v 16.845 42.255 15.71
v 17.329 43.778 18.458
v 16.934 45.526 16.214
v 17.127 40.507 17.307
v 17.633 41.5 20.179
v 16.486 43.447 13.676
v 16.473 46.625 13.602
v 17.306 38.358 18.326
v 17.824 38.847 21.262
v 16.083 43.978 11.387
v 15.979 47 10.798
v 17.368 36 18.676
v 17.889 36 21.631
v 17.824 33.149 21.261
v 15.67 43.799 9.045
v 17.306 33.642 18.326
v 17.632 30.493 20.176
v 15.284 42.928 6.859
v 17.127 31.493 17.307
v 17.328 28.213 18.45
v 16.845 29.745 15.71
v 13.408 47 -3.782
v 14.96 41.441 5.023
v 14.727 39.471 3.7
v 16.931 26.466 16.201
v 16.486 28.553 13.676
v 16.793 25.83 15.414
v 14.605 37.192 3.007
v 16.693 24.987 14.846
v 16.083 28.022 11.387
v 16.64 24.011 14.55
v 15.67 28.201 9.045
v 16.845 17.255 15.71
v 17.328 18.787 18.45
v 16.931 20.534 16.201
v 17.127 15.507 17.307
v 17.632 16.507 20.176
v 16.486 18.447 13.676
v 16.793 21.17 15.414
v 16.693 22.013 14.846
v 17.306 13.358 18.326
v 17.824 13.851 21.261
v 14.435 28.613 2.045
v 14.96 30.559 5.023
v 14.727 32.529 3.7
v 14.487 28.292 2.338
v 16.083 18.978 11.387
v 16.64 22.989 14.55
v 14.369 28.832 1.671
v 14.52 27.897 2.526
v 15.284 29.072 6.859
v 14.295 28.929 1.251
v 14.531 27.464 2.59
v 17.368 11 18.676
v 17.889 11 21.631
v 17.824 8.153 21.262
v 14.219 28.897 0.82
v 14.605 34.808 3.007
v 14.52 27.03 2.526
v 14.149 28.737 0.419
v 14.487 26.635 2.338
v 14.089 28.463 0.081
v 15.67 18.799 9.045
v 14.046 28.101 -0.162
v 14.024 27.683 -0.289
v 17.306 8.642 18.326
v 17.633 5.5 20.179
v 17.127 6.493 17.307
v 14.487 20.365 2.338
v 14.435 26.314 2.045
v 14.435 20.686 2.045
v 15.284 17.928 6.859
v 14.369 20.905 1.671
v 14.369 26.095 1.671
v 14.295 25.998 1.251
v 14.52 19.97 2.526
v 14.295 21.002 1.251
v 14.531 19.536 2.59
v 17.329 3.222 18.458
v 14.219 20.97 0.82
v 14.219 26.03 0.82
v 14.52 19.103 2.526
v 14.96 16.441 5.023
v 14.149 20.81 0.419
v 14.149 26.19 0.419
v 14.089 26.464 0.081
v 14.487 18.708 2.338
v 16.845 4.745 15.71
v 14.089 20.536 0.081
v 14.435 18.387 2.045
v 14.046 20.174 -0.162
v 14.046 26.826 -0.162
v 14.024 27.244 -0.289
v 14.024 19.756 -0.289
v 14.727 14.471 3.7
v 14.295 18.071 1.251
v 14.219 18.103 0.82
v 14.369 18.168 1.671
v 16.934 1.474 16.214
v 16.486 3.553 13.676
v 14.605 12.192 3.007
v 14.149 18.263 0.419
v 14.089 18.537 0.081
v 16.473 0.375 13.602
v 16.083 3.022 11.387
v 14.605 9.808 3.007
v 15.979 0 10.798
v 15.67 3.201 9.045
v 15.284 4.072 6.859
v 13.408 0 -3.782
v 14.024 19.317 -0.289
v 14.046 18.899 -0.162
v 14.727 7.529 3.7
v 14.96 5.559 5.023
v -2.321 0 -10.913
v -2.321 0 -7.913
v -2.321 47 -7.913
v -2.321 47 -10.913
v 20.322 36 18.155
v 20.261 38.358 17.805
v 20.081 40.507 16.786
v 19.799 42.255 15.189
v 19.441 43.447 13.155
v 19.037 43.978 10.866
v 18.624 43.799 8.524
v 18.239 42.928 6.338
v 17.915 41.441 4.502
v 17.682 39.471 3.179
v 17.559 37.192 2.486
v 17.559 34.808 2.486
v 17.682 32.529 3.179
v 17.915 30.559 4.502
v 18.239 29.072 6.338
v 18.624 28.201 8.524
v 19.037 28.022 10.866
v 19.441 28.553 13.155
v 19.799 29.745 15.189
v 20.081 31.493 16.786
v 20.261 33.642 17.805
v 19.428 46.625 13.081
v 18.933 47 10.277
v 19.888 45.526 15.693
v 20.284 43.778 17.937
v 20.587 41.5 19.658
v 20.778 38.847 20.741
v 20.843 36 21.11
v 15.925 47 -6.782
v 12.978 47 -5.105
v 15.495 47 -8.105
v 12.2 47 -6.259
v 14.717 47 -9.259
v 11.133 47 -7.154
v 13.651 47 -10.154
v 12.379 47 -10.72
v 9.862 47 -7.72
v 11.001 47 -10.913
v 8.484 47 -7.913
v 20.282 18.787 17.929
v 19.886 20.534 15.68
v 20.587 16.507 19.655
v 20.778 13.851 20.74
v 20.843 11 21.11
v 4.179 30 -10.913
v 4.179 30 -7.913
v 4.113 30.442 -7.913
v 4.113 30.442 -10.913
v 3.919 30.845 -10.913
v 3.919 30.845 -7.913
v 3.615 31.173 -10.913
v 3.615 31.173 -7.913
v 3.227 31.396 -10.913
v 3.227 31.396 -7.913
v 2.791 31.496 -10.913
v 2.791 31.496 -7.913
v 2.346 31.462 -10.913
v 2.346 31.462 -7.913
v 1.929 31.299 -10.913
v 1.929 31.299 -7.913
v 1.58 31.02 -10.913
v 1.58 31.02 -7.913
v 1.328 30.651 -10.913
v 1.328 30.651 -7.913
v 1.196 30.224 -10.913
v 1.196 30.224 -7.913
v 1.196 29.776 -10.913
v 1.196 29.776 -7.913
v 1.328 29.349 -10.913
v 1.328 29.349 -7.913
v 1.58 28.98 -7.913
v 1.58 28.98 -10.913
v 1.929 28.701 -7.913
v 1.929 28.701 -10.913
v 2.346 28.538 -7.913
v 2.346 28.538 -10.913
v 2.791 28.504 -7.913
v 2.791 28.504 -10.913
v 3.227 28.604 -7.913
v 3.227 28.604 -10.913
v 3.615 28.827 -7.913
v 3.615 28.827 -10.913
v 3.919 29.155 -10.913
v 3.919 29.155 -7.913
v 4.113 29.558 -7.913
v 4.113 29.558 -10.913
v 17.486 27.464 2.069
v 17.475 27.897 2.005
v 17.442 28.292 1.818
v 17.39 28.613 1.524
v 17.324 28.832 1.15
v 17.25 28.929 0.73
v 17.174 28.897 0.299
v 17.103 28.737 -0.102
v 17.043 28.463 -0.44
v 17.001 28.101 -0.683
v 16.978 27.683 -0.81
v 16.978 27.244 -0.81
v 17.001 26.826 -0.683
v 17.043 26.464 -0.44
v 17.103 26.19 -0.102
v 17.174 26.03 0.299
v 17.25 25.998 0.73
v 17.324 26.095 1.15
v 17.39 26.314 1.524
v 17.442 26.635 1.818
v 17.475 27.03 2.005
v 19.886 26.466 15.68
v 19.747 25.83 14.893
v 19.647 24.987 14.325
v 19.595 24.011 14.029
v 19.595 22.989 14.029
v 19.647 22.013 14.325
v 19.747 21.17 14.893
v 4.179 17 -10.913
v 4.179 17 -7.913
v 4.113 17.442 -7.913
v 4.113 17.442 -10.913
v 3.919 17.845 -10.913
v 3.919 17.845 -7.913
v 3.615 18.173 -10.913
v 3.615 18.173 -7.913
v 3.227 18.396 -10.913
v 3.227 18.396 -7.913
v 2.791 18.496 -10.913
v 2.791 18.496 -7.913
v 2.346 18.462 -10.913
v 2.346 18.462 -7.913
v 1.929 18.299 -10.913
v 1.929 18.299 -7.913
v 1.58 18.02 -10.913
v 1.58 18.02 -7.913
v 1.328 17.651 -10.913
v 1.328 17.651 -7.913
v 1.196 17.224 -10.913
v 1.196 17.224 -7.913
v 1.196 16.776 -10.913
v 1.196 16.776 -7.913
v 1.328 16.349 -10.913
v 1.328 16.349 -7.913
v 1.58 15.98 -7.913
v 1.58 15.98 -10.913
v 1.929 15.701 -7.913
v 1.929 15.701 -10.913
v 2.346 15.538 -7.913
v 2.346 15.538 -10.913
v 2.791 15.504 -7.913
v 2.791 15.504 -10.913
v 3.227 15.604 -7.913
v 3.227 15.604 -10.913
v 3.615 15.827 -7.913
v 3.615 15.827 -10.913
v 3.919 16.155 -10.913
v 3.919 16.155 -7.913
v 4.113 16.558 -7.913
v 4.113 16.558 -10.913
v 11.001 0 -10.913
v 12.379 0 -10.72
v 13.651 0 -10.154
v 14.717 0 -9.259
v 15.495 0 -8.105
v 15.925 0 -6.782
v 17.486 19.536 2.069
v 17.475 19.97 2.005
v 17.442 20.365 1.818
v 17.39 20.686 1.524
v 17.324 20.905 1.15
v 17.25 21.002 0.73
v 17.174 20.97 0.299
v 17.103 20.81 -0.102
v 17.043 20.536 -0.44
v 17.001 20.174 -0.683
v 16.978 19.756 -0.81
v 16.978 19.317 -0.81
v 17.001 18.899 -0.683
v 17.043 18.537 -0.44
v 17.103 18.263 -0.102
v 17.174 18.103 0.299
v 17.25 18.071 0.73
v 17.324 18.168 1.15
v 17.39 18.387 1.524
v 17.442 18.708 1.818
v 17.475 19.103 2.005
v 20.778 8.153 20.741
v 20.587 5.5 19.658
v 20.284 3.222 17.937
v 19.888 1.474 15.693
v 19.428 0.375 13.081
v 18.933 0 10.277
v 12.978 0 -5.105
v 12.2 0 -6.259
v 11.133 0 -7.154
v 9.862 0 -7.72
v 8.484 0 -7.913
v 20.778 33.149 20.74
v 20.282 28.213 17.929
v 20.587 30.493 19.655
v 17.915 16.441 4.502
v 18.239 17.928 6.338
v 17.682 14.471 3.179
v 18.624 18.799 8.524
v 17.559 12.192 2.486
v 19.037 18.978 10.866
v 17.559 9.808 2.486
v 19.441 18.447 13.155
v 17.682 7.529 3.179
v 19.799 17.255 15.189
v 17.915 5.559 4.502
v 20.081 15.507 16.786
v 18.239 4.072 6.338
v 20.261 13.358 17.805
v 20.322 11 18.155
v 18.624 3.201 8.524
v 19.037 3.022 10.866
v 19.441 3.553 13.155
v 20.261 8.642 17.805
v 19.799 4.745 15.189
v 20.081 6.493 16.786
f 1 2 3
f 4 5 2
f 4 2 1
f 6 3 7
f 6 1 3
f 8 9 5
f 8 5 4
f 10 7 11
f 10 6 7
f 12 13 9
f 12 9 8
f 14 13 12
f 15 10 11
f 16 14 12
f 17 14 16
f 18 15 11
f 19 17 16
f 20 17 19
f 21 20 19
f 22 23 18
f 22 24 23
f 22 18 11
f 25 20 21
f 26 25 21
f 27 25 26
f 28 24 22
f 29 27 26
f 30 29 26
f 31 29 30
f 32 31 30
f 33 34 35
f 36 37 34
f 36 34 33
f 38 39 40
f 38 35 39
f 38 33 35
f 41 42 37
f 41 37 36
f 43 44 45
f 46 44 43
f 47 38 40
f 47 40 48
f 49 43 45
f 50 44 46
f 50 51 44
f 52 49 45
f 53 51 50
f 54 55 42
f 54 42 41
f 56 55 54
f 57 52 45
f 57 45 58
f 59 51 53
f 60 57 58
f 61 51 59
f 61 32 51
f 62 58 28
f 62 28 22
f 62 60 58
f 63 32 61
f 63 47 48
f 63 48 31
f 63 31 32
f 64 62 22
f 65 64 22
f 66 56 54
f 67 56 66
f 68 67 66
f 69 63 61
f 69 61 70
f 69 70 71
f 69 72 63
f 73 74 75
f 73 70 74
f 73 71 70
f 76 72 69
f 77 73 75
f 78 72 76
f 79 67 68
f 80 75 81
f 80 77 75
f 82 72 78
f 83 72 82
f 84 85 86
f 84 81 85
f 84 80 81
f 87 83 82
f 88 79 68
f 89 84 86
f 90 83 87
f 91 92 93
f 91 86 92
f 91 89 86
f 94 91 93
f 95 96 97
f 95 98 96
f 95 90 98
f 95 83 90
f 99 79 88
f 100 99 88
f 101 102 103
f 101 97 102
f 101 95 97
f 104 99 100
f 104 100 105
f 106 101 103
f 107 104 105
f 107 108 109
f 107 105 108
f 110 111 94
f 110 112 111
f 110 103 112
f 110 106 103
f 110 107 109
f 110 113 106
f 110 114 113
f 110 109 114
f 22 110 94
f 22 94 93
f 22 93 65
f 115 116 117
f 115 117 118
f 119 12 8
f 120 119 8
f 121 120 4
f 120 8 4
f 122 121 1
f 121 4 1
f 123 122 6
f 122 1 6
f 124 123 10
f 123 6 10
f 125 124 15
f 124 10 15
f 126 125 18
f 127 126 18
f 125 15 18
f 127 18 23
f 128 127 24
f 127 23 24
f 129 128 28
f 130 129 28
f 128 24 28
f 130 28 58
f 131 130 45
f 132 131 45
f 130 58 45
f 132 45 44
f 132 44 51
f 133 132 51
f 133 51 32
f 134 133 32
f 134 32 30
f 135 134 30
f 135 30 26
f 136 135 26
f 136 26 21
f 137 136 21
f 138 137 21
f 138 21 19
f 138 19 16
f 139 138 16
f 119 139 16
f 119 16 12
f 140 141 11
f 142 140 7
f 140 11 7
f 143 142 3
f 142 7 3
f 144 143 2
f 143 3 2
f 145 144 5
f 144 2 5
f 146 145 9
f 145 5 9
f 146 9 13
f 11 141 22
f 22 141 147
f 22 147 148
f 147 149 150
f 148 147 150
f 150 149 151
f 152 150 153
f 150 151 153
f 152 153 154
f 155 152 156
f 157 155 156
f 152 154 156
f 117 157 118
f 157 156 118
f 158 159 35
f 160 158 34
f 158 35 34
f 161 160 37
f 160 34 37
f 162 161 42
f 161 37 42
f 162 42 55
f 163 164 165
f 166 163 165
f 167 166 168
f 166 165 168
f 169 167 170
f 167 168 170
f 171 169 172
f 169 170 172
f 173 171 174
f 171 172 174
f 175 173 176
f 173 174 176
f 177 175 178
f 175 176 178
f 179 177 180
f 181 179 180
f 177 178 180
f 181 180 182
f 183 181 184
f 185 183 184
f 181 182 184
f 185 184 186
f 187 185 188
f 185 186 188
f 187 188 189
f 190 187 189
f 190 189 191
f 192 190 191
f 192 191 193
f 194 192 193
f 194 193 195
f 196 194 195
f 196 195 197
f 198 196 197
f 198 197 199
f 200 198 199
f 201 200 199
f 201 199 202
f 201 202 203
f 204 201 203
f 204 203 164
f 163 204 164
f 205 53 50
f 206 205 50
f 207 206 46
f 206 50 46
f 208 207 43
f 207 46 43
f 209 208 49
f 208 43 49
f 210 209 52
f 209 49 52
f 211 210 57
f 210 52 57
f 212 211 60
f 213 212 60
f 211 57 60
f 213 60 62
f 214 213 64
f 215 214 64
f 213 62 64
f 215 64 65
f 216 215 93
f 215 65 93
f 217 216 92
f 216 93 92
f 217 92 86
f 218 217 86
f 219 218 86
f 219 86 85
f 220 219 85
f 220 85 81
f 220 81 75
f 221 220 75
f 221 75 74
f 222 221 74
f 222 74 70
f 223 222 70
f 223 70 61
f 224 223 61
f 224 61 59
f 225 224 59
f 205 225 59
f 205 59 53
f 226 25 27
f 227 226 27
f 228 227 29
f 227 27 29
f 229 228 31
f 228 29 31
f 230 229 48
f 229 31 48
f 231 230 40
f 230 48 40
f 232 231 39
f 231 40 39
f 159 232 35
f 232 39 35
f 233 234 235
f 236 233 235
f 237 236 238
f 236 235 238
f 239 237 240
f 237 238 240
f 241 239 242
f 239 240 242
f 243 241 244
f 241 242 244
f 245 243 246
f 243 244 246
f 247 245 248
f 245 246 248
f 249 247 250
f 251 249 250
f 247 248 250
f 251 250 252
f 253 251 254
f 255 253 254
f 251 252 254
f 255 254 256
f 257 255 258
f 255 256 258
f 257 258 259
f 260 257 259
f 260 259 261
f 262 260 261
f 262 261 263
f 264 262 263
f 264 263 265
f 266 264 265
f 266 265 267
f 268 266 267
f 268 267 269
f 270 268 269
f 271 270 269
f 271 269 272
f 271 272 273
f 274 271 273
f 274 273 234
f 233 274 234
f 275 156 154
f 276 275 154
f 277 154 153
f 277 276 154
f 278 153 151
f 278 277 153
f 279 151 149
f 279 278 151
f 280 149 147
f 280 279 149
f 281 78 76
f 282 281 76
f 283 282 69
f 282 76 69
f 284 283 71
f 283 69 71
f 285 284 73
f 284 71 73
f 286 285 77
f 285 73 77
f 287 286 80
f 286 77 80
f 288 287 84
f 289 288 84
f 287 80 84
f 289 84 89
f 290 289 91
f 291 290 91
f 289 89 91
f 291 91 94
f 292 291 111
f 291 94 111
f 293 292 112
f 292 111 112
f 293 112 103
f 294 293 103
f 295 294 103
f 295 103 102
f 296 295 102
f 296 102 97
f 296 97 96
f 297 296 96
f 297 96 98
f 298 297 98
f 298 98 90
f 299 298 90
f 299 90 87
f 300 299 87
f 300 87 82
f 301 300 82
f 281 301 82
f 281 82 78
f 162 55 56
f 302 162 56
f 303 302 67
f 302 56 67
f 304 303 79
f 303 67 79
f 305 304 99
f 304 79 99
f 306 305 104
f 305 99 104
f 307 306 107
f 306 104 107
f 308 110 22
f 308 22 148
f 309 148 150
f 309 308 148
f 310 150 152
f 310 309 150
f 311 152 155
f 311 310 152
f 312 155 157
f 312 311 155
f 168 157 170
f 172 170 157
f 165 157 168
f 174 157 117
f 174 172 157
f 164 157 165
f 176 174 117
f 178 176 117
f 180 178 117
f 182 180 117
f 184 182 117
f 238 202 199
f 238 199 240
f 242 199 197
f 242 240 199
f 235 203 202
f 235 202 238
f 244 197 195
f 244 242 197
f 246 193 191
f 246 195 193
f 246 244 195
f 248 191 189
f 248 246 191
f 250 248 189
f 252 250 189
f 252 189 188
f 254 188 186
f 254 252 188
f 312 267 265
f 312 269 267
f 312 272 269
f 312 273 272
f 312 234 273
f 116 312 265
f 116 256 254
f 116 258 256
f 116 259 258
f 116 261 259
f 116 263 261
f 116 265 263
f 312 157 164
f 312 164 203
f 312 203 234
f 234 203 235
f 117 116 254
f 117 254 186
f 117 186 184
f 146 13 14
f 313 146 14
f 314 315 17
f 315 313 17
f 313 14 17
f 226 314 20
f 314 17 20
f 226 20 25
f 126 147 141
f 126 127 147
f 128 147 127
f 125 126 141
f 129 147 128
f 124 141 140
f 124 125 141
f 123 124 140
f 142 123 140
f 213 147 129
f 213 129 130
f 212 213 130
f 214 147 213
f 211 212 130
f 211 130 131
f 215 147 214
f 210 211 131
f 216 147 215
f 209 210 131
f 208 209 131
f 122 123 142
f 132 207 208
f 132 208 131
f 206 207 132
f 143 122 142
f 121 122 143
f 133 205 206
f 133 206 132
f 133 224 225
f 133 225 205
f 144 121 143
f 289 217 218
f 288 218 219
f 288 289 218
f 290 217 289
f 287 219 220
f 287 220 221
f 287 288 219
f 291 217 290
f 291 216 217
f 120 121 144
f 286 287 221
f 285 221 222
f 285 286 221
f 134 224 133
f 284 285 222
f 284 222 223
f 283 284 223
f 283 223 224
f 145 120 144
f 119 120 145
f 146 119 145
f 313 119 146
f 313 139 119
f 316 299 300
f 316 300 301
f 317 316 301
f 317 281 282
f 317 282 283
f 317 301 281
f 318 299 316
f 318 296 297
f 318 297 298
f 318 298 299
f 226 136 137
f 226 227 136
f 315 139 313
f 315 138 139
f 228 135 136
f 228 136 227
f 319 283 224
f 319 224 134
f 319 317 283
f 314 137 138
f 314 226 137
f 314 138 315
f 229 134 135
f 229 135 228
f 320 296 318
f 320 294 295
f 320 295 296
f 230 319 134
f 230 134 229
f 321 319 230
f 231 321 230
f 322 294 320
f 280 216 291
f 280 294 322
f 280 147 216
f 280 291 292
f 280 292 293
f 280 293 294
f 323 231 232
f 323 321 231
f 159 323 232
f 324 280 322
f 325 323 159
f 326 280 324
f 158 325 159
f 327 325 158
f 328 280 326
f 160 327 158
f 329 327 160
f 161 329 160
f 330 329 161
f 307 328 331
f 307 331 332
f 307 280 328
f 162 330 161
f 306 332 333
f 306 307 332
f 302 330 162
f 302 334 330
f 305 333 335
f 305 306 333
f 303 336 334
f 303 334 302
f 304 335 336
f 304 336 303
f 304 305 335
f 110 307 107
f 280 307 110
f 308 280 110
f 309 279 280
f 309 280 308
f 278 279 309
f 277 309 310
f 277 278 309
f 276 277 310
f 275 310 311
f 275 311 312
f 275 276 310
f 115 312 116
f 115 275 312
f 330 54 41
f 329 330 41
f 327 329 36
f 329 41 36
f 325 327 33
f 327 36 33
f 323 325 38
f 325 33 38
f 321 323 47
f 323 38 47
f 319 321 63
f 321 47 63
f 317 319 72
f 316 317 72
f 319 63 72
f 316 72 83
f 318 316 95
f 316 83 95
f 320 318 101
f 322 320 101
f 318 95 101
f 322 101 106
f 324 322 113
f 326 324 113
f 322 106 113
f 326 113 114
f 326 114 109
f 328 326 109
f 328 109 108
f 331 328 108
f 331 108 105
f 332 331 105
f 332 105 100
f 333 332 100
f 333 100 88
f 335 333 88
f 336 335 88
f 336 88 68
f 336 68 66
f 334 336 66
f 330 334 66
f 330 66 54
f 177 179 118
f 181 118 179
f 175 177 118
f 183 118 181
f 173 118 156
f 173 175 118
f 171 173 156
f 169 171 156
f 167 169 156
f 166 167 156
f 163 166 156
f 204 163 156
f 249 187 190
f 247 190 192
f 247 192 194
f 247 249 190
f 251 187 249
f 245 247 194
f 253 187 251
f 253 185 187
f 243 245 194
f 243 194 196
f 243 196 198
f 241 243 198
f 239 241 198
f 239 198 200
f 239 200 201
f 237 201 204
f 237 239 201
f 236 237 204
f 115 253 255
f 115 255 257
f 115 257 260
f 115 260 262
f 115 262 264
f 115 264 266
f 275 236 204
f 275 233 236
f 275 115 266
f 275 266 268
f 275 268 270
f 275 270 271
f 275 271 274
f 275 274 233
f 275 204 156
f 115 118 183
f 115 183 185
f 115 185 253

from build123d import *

# Parameters (mm, degrees)
BOSS_EXTRUDE1_DEPTH = 47
SKETCH2_R           = 1.5
CUT_EXTRUDE1_DEPTH  = 4
SKETCH3_R           = 8
CUT_EXTRUDE2_DEPTH  = 9.560785614
SKETCH4_R           = 1.47
CUT_EXTRUDE3_DEPTH  = 9.560785614


with BuildPart() as part:
    # Sketch1 → Boss-Extrude1 (new body)
    with BuildSketch(Plane(origin=(0, 0, 0), x_dir=(1, 0, 0), z_dir=(0, 1, 0))):
        with BuildLine():
            Line((-2.32059976, 10.913457617), (11.001200978, 10.913457617))
            ThreePointArc((11.001200978, 10.913457617), (14.215139026, 9.743679833), (15.925239743, 6.781698506))
            Line((15.925239743, 6.781698506), (20.843268829, -21.10983044))
            Line((20.843268829, -21.10983044), (17.88884557, -21.630774973))
            Line((17.88884557, -21.630774973), (13.407940849, 3.781698506))
            ThreePointArc((13.407940849, 3.781698506), (11.697840132, 6.743679833), (8.483902084, 7.913457617))
            Line((8.483902084, 7.913457617), (-2.32059976, 7.913457617))
            Line((-2.32059976, 7.913457617), (-2.32059976, 10.913457617))
        make_face()
    extrude(amount=BOSS_EXTRUDE1_DEPTH)

    # Sketch2 → Cut-Extrude1 (cut, through all)
    with BuildSketch(Plane.XY.offset(-7.913457617)):
        with Locations((2.67940024, 30)):
            Circle(SKETCH2_R)
        with Locations((2.67940024, 17)):
            Circle(SKETCH2_R)
    extrude(amount=-CUT_EXTRUDE1_DEPTH, mode=Mode.SUBTRACT)

    # Sketch3 → Cut-Extrude2 (cut, through all)
    with BuildSketch(Plane(origin=(13.650350495, 0, -2.406925088), x_dir=(0.173648178, 0, 0.984807753), z_dir=(-0.984807753, 0, 0.173648178))):
        with BuildLine():
            Line((24.408520331, 47), (13.408520331, 47))
            ThreePointArc((13.408520331, 47), (21.186694924, 43.778174593), (24.408520331, 36))
            Line((24.408520331, 36), (24.408520331, 47))
        make_face()
        with BuildLine():
            Line((24.408520331, 0), (24.408520331, 11))
            ThreePointArc((24.408520331, 11), (21.186694924, 3.221825407), (13.408520331, 0))
            Line((13.408520331, 0), (24.408520331, 0))
        make_face()
        with Locations((13.408520331, 11)):
            Circle(SKETCH3_R)
        with Locations((13.408520331, 36)):
            Circle(SKETCH3_R)
        with BuildLine():
            Line((24.408520331, 11), (24.408520331, 36))
            ThreePointArc((24.408520331, 36), (22.930853605, 30.493170692), (18.894853235, 26.465842918))
            ThreePointArc((18.894853235, 26.465842918), (17.17968635, 23.5), (18.894853235, 20.534157082))
            ThreePointArc((18.894853235, 20.534157082), (22.930853605, 16.506829308), (24.408520331, 11))
        make_face()
    extrude(amount=-CUT_EXTRUDE2_DEPTH, mode=Mode.SUBTRACT)

    # Sketch4 → Cut-Extrude3 (cut, through all)
    with BuildSketch(Plane(origin=(13.650350495, 0, -2.406925088), x_dir=(0.173648178, 0, 0.984807753), z_dir=(-0.984807753, 0, 0.173648178))):
        with Locations((3.604018487, 27.463505193)):
            Circle(SKETCH4_R)
        with Locations((3.604018487, 19.536494807)):
            Circle(SKETCH4_R)
    extrude(amount=-CUT_EXTRUDE3_DEPTH, mode=Mode.SUBTRACT)


solid = part.part
